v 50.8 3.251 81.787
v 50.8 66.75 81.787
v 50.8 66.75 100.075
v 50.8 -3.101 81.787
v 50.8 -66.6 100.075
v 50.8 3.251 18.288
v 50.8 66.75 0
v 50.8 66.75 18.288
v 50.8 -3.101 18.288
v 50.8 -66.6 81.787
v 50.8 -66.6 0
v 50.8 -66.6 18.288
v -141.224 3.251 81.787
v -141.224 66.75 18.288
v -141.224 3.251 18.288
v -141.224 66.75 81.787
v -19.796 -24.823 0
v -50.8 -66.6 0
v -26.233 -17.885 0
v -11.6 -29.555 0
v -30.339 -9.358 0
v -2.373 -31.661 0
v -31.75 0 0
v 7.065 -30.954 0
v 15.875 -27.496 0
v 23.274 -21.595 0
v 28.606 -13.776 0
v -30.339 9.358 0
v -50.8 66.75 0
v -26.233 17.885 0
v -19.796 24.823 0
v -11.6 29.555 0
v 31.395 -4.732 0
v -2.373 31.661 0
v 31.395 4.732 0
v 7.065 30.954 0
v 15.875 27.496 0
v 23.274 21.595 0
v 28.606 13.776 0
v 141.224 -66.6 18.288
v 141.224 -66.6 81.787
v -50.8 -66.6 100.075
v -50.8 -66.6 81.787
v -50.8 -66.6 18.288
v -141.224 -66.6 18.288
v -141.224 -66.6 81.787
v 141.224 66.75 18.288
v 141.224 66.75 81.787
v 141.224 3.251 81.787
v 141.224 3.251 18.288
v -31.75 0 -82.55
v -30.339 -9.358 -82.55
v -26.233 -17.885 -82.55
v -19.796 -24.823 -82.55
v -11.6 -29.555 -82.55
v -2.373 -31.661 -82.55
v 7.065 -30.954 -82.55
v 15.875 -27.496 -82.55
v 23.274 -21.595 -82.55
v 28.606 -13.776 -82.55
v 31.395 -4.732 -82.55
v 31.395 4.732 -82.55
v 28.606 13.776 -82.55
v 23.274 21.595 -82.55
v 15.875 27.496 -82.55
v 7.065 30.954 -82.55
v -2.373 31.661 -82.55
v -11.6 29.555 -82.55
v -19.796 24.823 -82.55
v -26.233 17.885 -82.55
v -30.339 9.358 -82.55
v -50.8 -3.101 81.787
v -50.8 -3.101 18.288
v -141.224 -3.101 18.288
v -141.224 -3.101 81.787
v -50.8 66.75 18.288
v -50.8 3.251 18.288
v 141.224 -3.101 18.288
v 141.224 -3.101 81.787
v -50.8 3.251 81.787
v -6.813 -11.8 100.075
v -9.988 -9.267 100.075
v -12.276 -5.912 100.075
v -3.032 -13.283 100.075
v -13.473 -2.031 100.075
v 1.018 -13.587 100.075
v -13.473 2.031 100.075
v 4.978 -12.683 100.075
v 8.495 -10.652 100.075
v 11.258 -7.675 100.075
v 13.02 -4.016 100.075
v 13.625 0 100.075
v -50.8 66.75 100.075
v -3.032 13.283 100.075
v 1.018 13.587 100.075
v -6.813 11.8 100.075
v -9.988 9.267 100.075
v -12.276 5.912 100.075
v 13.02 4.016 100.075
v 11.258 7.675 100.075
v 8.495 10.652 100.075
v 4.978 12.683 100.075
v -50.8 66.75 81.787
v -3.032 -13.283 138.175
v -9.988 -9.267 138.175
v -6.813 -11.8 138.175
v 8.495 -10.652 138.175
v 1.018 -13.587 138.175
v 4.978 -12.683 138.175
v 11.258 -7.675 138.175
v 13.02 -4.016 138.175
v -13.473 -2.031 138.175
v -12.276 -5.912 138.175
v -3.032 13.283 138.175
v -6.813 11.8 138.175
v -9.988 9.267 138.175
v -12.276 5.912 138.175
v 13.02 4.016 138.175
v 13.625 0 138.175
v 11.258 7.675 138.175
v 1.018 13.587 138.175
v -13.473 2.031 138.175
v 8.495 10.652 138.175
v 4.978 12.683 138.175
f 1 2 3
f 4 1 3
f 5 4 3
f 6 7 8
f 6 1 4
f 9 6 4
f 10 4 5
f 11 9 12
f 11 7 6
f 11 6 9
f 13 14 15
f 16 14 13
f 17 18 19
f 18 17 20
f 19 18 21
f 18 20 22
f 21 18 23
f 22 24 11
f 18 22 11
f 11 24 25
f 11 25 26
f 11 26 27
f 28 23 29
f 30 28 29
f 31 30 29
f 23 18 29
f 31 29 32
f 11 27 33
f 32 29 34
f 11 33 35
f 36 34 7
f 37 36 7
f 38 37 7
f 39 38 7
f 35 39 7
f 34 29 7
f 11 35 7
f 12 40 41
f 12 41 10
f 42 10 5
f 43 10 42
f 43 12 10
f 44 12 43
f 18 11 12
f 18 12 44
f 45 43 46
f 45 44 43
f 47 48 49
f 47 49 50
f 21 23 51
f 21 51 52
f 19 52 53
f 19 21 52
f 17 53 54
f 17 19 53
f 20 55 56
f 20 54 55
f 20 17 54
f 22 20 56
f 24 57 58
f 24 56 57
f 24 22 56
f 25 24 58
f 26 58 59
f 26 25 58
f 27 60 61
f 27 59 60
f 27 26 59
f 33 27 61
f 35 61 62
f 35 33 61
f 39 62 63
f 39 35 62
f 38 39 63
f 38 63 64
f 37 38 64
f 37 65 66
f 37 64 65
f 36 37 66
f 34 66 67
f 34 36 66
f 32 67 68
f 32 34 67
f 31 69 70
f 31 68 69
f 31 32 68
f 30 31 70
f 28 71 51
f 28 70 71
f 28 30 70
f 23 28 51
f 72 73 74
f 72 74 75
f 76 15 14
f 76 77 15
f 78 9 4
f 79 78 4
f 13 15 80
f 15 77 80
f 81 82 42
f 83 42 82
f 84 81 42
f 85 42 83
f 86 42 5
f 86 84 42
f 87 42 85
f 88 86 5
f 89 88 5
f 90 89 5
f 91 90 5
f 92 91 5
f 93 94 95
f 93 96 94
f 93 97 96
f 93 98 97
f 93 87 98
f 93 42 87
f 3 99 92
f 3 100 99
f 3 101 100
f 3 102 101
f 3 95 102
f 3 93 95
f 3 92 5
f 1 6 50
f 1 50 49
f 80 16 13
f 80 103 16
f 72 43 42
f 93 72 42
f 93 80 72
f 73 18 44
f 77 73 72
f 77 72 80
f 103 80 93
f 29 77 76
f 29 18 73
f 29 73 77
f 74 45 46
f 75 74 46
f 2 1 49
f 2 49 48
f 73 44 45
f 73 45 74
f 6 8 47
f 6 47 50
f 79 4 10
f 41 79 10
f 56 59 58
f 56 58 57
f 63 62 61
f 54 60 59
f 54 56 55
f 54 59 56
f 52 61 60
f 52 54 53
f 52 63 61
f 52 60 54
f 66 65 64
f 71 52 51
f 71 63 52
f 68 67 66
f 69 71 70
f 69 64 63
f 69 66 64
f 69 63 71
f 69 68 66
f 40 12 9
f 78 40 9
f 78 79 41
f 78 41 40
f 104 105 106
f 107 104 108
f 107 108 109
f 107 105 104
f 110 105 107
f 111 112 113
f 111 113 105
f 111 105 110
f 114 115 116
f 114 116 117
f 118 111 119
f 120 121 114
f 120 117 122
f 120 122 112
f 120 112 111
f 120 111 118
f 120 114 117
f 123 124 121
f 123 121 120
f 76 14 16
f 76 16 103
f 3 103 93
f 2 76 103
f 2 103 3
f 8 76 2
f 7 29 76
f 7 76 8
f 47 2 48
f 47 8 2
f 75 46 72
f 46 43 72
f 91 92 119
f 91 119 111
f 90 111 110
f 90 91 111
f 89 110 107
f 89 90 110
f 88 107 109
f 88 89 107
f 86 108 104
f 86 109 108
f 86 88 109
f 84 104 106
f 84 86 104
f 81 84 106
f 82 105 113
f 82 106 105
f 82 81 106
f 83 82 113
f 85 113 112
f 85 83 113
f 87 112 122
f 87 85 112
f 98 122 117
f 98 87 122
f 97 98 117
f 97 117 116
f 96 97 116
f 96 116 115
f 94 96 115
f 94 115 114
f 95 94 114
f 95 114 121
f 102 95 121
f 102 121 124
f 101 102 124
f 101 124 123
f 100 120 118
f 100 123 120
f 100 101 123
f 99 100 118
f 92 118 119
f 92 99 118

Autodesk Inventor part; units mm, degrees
ref_plane "YZ Plane" through (0, 0, 0) normal (1, 0, 0) x (0, 1, 0)
ref_plane "XZ Plane" through (0, 0, 0) normal (0, 1, 0) x (-1, 0, 0)
ref_plane "XY Plane" through (0, 0, 0) normal (0, 0, 1) x (1, 0, 0)
sketch "Sketch1" plane through (0, 0, 0) normal (0, 0, 1) x (1, 0, 0)
  line L0 (-50.8, 66.75) -> (50.8, 66.75)
  line L1 (50.8, 66.75) -> (50.8, -66.6)
  line L2 (50.8, -66.6) -> (-50.8, -66.6)
  line L3 (-50.8, -66.6) -> (-50.8, 66.75)
  point P0 (0, 0)
  dimension "d1" = 101.6
  dimension "d2" = 133.35
  dimension "d3" = 66.75
  dimension "d4" = 50.8
extrude "Extrusion1" add sketch "Sketch1" along normal blind 100.075
sketch "Sketch2" plane through (0, 0, 100.075) normal (0, 0, 1) x (1, 0, 0)
  circle A0 centre (0, 0) radius 13.625
  dimension "d7" = 27.25
extrude "Extrusion2" add sketch "Sketch2" along normal blind 38.1
sketch "Sketch3" plane through (0, 0, 0) normal (0, 0, -1) x (-1, 0, 0)
  circle A0 centre (0, 0) radius 31.75
  dimension "d10" = 63.5
extrude "Extrusion3" add sketch "Sketch3" along normal blind 82.55
sketch "Sketch4" plane through (50.8, -66.6, 0) normal (1, 0, 0) x (0, 0, -1)
  line L0 (0, 133.35) -> (-100.075, 133.35) projected
  line L1 (-81.787, 133.35) -> (-18.288, 133.35)
  line L2 (-18.288, 133.35) -> (-18.288, 69.851)
  line L3 (-18.288, 69.851) -> (-81.787, 69.851)
  line L4 (-81.787, 69.851) -> (-81.787, 133.35)
  line L5 (0, 133.35) -> (0, 0) projected
  line L6 (-100.075, 0) -> (-100.075, 133.35) projected
  line L7 (0, 0) -> (-100.075, 0) projected
  line L8 (-81.787, 0) -> (-18.288, 0)
  line L9 (-18.288, 0) -> (-18.288, 63.499)
  line L10 (-18.288, 63.499) -> (-81.787, 63.499)
  line L11 (-81.787, 63.499) -> (-81.787, 0)
  point P0 (0, 66.6)
  dimension "d13" = 18.288
  dimension "d14" = 18.288
  dimension "d15" = 63.499
  dimension "d16" = 63.499
  dimension "d17" = 63.499
extrude "Extrusion4" add sketch "Sketch4" along normal blind 90.424 contours L2 L3 L4 L0 | L7 L11 L10 L9
sketch "Sketch5" plane through (-50.8, -66.6, 0) normal (-1, 0, 0) x (0, 0, 1)
  line L0 (18.288, 69.851) -> (18.288, 133.35) projected
  line L1 (18.288, 69.851) -> (81.787, 69.851) projected
  line L2 (18.288, 133.35) -> (81.787, 133.35)
  line L3 (81.787, 133.35) -> (81.787, 69.851)
  line L4 (81.787, 69.851) -> (18.288, 69.851)
  line L5 (18.288, 69.851) -> (18.288, 133.35)
  line L6 (18.288, 0) -> (18.288, 63.499) projected
  line L7 (81.787, 0) -> (81.787, 63.499) projected
  line L8 (18.288, 63.499) -> (81.787, 63.499)
  line L9 (81.787, 63.499) -> (81.787, 0)
  line L10 (81.787, 0) -> (18.288, 0)
  line L11 (18.288, 0) -> (18.288, 63.499)
  point P0 (0, 66.6)
extrude "Extrusion5" add sketch "Sketch5" along normal blind 90.424
equation "\"d16\" = d15"
equation "\"d17\" = d15"
properties part number "Semi Rotary Hydraulic Motor"
